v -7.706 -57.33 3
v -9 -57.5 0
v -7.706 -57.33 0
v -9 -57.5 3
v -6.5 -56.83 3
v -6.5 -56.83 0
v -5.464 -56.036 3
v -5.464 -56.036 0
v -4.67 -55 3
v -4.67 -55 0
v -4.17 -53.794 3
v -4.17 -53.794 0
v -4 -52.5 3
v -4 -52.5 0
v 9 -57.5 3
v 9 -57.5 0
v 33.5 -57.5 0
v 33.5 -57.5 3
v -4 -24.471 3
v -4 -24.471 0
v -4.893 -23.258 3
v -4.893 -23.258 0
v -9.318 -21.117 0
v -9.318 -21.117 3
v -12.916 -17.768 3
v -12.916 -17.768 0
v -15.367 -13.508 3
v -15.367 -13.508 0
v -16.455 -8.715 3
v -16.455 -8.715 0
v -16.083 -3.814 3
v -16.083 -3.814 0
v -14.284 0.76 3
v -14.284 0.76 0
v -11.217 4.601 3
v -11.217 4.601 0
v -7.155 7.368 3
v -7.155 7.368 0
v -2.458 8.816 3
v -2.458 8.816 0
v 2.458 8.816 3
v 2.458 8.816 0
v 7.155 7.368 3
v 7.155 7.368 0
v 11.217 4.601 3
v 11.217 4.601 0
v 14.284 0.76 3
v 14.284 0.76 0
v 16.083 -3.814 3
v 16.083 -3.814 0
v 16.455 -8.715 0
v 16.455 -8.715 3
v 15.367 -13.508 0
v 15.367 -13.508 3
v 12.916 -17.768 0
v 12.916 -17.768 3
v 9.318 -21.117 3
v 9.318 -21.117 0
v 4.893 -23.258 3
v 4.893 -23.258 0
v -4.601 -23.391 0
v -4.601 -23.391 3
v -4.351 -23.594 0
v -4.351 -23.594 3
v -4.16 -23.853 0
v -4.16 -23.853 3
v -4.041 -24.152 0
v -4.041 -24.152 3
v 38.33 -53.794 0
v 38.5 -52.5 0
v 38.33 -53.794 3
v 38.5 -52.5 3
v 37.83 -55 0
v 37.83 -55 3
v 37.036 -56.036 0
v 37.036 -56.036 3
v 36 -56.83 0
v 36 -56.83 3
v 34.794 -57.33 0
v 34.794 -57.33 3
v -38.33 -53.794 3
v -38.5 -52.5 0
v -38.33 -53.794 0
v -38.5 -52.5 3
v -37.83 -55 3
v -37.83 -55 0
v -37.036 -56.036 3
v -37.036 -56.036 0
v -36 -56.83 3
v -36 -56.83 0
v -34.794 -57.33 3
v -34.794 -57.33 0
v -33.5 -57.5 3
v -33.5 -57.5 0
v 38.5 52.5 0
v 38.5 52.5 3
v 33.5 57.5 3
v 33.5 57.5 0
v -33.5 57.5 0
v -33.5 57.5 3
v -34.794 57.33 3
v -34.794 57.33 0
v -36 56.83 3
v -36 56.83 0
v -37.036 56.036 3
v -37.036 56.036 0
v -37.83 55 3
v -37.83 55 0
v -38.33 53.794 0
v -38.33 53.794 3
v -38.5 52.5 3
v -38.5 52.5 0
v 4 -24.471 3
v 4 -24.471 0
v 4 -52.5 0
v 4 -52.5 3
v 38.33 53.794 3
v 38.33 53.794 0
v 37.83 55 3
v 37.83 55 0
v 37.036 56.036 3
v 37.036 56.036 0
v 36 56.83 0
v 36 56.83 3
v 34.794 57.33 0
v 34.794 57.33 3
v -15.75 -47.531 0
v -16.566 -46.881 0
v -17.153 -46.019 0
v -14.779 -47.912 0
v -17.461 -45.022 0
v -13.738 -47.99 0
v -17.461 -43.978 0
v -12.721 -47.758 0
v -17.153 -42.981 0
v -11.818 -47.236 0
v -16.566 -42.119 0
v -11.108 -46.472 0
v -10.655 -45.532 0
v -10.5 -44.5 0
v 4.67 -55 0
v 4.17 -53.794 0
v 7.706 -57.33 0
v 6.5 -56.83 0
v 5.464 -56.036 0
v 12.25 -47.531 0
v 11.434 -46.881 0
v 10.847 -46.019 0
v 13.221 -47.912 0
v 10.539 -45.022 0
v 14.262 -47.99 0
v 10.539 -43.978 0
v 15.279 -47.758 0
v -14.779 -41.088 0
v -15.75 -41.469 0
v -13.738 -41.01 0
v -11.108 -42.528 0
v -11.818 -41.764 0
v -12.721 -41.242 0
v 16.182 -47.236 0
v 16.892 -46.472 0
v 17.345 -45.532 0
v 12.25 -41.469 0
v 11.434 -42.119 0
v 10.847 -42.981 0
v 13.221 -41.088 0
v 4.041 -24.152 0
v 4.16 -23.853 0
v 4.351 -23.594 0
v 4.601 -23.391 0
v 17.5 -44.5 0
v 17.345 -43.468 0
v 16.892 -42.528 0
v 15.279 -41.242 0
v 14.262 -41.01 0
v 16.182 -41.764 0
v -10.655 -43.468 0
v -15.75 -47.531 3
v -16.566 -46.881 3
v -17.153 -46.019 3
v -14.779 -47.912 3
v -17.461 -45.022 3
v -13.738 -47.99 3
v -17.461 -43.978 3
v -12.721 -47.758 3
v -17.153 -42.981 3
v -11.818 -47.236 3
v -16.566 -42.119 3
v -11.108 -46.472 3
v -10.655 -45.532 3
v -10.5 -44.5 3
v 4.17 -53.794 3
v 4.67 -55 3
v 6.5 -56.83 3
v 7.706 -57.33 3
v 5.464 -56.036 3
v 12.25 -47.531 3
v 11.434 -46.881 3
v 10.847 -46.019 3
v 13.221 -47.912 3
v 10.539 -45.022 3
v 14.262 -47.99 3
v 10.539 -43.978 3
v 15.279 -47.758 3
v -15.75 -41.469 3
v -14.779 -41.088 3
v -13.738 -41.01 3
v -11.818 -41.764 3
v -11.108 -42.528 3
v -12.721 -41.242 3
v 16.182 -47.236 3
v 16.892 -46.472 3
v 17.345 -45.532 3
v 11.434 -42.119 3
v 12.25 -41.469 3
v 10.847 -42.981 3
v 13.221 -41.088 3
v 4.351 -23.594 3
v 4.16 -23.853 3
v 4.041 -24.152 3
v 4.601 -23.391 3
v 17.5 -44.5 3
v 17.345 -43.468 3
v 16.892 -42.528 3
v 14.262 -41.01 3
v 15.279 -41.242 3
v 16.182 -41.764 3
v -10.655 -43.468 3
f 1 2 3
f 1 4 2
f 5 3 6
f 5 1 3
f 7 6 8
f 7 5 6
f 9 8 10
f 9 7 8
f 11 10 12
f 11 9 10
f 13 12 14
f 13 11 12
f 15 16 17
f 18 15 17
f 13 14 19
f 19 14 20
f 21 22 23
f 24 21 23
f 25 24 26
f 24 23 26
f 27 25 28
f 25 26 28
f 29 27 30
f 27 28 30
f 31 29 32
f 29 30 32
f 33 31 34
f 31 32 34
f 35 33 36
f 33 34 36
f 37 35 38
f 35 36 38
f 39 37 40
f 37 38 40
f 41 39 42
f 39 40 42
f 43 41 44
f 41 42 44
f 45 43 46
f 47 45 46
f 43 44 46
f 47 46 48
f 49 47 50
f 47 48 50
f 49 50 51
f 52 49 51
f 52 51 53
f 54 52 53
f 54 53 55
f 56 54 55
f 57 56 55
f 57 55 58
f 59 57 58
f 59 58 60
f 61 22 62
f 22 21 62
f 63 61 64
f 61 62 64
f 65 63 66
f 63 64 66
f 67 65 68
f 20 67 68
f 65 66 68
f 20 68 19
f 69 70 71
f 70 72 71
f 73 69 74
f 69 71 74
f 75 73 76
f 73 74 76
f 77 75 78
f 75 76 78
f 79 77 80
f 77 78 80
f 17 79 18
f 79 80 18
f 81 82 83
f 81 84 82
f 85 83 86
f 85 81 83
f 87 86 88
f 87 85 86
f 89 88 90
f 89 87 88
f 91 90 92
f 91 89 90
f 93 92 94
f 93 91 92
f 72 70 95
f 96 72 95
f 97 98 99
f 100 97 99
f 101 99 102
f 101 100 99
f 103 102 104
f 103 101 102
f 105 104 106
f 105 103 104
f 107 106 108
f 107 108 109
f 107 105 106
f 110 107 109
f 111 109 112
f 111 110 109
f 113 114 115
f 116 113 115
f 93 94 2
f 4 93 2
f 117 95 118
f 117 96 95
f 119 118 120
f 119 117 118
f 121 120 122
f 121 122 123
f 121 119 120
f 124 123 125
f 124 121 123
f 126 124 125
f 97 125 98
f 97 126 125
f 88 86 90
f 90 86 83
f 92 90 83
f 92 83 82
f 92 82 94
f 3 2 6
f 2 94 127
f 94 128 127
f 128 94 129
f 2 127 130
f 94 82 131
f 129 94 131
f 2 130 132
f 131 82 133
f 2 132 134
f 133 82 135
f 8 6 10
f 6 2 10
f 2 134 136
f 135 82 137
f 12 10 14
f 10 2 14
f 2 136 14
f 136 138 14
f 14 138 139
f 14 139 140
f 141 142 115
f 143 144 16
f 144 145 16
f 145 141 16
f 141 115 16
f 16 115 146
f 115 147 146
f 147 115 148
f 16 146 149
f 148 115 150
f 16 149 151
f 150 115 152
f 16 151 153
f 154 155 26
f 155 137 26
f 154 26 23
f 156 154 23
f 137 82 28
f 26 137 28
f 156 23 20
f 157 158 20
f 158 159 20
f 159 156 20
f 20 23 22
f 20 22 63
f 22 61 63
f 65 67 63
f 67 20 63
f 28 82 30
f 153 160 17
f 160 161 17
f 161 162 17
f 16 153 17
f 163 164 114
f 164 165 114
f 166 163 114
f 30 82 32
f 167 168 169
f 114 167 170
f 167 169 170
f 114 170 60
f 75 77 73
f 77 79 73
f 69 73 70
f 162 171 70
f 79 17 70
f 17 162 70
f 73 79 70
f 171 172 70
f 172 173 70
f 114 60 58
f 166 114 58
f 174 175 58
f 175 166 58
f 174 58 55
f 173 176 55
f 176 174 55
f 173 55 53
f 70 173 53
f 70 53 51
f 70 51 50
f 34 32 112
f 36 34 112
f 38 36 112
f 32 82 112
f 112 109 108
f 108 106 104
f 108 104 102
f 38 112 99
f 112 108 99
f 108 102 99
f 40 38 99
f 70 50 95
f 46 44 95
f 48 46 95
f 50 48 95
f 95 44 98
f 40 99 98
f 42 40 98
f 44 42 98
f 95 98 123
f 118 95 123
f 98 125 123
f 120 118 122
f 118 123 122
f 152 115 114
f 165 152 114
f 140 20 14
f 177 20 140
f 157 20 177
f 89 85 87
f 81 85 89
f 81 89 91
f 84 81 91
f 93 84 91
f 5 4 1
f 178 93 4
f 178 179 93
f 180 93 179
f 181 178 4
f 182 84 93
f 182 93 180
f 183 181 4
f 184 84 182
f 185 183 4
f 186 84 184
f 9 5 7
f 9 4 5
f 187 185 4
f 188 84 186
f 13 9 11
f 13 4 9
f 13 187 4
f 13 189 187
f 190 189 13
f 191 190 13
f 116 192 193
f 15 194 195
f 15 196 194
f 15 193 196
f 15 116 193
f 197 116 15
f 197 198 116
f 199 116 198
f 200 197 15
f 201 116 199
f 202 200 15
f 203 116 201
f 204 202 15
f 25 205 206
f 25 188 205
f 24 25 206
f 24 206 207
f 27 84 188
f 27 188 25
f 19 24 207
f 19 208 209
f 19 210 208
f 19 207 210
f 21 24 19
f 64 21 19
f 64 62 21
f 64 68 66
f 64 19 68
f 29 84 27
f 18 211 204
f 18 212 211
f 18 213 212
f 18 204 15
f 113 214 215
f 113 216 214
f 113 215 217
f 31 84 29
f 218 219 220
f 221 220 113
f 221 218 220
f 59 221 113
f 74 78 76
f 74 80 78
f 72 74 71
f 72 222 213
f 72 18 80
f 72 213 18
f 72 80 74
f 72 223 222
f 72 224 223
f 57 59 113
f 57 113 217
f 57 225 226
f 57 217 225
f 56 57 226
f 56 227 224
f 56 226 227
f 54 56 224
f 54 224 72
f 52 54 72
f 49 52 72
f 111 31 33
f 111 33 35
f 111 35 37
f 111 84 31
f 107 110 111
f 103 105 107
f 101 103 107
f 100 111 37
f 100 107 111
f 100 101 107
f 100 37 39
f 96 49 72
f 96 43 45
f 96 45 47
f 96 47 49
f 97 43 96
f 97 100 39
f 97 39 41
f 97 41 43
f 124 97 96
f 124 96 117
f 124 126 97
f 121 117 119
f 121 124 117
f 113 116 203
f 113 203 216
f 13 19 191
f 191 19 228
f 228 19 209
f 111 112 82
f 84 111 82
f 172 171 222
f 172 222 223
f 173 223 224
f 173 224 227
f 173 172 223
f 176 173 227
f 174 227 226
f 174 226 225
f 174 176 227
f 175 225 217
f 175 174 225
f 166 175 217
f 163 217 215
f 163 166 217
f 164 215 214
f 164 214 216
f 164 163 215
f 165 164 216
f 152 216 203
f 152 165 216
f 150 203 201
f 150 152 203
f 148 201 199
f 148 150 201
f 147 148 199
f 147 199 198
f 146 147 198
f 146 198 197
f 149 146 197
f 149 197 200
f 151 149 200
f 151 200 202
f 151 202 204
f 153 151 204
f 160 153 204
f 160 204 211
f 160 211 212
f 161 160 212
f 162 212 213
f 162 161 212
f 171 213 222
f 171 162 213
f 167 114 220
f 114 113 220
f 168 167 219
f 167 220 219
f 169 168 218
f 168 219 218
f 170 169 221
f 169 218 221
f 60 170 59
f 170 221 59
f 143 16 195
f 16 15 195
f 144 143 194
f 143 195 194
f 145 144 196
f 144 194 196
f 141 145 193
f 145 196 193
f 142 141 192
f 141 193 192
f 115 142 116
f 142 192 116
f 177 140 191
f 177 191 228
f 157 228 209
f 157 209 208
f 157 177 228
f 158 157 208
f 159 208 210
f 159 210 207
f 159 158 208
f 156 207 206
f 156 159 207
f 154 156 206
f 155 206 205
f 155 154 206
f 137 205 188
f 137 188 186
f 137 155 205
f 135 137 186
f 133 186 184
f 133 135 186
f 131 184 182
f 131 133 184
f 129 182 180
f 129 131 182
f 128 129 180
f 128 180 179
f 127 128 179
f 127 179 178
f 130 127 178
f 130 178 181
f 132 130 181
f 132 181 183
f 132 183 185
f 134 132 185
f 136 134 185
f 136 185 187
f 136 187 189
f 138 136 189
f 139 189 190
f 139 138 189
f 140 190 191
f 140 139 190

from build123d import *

# Parameters (mm, degrees)
F0_R     = 3.5
F1_DEPTH = 3
F2_R     = 5
F3_R     = 1.27


with BuildPart() as f1:
    # F0 (on Top) → F1 (new body)
    with BuildSketch(Plane.XY):
        with BuildLine():
            Line((38.5, -57.5), (38.5, 57.5))
            Line((38.5, 57.5), (-38.5, 57.5))
            Line((-38.5, 57.5), (-38.5, -57.5))
            Line((-38.5, -57.5), (-4, -57.5))
            Line((-4, -57.5), (-4, -23.507811))
            ThreePointArc((-4, -23.507811), (0, 9), (4, -23.507811))
            Line((4, -23.507811), (4, -57.5))
            Line((4, -57.5), (38.5, -57.5))
        make_face()
        with Locations((-14, -44.5)):
            Circle(F0_R, mode=Mode.SUBTRACT)
        with Locations((14, -44.5)):
            Circle(F0_R, mode=Mode.SUBTRACT)
    extrude(amount=F1_DEPTH)

    # F2
    f2_edges = [f1.edges().sort_by_distance(p)[0] for p in [
        (-38.5, 57.5, 1.5),
        (38.5, 57.5, 1.5),
        (-38.5, -57.5, 1.5),
        (38.5, -57.5, 1.5),
        (4, -57.5, 1.5),
        (-4, -57.5, 1.5),
    ]]
    fillet(f2_edges, radius=F2_R)

    # F3
    f3_edges = [f1.edges().sort_by_distance(p)[0] for p in [
        (4, -23.507811, 1.5),
        (-4, -23.507811, 1.5),
    ]]
    fillet(f3_edges, radius=F3_R)


solid = f1.part
